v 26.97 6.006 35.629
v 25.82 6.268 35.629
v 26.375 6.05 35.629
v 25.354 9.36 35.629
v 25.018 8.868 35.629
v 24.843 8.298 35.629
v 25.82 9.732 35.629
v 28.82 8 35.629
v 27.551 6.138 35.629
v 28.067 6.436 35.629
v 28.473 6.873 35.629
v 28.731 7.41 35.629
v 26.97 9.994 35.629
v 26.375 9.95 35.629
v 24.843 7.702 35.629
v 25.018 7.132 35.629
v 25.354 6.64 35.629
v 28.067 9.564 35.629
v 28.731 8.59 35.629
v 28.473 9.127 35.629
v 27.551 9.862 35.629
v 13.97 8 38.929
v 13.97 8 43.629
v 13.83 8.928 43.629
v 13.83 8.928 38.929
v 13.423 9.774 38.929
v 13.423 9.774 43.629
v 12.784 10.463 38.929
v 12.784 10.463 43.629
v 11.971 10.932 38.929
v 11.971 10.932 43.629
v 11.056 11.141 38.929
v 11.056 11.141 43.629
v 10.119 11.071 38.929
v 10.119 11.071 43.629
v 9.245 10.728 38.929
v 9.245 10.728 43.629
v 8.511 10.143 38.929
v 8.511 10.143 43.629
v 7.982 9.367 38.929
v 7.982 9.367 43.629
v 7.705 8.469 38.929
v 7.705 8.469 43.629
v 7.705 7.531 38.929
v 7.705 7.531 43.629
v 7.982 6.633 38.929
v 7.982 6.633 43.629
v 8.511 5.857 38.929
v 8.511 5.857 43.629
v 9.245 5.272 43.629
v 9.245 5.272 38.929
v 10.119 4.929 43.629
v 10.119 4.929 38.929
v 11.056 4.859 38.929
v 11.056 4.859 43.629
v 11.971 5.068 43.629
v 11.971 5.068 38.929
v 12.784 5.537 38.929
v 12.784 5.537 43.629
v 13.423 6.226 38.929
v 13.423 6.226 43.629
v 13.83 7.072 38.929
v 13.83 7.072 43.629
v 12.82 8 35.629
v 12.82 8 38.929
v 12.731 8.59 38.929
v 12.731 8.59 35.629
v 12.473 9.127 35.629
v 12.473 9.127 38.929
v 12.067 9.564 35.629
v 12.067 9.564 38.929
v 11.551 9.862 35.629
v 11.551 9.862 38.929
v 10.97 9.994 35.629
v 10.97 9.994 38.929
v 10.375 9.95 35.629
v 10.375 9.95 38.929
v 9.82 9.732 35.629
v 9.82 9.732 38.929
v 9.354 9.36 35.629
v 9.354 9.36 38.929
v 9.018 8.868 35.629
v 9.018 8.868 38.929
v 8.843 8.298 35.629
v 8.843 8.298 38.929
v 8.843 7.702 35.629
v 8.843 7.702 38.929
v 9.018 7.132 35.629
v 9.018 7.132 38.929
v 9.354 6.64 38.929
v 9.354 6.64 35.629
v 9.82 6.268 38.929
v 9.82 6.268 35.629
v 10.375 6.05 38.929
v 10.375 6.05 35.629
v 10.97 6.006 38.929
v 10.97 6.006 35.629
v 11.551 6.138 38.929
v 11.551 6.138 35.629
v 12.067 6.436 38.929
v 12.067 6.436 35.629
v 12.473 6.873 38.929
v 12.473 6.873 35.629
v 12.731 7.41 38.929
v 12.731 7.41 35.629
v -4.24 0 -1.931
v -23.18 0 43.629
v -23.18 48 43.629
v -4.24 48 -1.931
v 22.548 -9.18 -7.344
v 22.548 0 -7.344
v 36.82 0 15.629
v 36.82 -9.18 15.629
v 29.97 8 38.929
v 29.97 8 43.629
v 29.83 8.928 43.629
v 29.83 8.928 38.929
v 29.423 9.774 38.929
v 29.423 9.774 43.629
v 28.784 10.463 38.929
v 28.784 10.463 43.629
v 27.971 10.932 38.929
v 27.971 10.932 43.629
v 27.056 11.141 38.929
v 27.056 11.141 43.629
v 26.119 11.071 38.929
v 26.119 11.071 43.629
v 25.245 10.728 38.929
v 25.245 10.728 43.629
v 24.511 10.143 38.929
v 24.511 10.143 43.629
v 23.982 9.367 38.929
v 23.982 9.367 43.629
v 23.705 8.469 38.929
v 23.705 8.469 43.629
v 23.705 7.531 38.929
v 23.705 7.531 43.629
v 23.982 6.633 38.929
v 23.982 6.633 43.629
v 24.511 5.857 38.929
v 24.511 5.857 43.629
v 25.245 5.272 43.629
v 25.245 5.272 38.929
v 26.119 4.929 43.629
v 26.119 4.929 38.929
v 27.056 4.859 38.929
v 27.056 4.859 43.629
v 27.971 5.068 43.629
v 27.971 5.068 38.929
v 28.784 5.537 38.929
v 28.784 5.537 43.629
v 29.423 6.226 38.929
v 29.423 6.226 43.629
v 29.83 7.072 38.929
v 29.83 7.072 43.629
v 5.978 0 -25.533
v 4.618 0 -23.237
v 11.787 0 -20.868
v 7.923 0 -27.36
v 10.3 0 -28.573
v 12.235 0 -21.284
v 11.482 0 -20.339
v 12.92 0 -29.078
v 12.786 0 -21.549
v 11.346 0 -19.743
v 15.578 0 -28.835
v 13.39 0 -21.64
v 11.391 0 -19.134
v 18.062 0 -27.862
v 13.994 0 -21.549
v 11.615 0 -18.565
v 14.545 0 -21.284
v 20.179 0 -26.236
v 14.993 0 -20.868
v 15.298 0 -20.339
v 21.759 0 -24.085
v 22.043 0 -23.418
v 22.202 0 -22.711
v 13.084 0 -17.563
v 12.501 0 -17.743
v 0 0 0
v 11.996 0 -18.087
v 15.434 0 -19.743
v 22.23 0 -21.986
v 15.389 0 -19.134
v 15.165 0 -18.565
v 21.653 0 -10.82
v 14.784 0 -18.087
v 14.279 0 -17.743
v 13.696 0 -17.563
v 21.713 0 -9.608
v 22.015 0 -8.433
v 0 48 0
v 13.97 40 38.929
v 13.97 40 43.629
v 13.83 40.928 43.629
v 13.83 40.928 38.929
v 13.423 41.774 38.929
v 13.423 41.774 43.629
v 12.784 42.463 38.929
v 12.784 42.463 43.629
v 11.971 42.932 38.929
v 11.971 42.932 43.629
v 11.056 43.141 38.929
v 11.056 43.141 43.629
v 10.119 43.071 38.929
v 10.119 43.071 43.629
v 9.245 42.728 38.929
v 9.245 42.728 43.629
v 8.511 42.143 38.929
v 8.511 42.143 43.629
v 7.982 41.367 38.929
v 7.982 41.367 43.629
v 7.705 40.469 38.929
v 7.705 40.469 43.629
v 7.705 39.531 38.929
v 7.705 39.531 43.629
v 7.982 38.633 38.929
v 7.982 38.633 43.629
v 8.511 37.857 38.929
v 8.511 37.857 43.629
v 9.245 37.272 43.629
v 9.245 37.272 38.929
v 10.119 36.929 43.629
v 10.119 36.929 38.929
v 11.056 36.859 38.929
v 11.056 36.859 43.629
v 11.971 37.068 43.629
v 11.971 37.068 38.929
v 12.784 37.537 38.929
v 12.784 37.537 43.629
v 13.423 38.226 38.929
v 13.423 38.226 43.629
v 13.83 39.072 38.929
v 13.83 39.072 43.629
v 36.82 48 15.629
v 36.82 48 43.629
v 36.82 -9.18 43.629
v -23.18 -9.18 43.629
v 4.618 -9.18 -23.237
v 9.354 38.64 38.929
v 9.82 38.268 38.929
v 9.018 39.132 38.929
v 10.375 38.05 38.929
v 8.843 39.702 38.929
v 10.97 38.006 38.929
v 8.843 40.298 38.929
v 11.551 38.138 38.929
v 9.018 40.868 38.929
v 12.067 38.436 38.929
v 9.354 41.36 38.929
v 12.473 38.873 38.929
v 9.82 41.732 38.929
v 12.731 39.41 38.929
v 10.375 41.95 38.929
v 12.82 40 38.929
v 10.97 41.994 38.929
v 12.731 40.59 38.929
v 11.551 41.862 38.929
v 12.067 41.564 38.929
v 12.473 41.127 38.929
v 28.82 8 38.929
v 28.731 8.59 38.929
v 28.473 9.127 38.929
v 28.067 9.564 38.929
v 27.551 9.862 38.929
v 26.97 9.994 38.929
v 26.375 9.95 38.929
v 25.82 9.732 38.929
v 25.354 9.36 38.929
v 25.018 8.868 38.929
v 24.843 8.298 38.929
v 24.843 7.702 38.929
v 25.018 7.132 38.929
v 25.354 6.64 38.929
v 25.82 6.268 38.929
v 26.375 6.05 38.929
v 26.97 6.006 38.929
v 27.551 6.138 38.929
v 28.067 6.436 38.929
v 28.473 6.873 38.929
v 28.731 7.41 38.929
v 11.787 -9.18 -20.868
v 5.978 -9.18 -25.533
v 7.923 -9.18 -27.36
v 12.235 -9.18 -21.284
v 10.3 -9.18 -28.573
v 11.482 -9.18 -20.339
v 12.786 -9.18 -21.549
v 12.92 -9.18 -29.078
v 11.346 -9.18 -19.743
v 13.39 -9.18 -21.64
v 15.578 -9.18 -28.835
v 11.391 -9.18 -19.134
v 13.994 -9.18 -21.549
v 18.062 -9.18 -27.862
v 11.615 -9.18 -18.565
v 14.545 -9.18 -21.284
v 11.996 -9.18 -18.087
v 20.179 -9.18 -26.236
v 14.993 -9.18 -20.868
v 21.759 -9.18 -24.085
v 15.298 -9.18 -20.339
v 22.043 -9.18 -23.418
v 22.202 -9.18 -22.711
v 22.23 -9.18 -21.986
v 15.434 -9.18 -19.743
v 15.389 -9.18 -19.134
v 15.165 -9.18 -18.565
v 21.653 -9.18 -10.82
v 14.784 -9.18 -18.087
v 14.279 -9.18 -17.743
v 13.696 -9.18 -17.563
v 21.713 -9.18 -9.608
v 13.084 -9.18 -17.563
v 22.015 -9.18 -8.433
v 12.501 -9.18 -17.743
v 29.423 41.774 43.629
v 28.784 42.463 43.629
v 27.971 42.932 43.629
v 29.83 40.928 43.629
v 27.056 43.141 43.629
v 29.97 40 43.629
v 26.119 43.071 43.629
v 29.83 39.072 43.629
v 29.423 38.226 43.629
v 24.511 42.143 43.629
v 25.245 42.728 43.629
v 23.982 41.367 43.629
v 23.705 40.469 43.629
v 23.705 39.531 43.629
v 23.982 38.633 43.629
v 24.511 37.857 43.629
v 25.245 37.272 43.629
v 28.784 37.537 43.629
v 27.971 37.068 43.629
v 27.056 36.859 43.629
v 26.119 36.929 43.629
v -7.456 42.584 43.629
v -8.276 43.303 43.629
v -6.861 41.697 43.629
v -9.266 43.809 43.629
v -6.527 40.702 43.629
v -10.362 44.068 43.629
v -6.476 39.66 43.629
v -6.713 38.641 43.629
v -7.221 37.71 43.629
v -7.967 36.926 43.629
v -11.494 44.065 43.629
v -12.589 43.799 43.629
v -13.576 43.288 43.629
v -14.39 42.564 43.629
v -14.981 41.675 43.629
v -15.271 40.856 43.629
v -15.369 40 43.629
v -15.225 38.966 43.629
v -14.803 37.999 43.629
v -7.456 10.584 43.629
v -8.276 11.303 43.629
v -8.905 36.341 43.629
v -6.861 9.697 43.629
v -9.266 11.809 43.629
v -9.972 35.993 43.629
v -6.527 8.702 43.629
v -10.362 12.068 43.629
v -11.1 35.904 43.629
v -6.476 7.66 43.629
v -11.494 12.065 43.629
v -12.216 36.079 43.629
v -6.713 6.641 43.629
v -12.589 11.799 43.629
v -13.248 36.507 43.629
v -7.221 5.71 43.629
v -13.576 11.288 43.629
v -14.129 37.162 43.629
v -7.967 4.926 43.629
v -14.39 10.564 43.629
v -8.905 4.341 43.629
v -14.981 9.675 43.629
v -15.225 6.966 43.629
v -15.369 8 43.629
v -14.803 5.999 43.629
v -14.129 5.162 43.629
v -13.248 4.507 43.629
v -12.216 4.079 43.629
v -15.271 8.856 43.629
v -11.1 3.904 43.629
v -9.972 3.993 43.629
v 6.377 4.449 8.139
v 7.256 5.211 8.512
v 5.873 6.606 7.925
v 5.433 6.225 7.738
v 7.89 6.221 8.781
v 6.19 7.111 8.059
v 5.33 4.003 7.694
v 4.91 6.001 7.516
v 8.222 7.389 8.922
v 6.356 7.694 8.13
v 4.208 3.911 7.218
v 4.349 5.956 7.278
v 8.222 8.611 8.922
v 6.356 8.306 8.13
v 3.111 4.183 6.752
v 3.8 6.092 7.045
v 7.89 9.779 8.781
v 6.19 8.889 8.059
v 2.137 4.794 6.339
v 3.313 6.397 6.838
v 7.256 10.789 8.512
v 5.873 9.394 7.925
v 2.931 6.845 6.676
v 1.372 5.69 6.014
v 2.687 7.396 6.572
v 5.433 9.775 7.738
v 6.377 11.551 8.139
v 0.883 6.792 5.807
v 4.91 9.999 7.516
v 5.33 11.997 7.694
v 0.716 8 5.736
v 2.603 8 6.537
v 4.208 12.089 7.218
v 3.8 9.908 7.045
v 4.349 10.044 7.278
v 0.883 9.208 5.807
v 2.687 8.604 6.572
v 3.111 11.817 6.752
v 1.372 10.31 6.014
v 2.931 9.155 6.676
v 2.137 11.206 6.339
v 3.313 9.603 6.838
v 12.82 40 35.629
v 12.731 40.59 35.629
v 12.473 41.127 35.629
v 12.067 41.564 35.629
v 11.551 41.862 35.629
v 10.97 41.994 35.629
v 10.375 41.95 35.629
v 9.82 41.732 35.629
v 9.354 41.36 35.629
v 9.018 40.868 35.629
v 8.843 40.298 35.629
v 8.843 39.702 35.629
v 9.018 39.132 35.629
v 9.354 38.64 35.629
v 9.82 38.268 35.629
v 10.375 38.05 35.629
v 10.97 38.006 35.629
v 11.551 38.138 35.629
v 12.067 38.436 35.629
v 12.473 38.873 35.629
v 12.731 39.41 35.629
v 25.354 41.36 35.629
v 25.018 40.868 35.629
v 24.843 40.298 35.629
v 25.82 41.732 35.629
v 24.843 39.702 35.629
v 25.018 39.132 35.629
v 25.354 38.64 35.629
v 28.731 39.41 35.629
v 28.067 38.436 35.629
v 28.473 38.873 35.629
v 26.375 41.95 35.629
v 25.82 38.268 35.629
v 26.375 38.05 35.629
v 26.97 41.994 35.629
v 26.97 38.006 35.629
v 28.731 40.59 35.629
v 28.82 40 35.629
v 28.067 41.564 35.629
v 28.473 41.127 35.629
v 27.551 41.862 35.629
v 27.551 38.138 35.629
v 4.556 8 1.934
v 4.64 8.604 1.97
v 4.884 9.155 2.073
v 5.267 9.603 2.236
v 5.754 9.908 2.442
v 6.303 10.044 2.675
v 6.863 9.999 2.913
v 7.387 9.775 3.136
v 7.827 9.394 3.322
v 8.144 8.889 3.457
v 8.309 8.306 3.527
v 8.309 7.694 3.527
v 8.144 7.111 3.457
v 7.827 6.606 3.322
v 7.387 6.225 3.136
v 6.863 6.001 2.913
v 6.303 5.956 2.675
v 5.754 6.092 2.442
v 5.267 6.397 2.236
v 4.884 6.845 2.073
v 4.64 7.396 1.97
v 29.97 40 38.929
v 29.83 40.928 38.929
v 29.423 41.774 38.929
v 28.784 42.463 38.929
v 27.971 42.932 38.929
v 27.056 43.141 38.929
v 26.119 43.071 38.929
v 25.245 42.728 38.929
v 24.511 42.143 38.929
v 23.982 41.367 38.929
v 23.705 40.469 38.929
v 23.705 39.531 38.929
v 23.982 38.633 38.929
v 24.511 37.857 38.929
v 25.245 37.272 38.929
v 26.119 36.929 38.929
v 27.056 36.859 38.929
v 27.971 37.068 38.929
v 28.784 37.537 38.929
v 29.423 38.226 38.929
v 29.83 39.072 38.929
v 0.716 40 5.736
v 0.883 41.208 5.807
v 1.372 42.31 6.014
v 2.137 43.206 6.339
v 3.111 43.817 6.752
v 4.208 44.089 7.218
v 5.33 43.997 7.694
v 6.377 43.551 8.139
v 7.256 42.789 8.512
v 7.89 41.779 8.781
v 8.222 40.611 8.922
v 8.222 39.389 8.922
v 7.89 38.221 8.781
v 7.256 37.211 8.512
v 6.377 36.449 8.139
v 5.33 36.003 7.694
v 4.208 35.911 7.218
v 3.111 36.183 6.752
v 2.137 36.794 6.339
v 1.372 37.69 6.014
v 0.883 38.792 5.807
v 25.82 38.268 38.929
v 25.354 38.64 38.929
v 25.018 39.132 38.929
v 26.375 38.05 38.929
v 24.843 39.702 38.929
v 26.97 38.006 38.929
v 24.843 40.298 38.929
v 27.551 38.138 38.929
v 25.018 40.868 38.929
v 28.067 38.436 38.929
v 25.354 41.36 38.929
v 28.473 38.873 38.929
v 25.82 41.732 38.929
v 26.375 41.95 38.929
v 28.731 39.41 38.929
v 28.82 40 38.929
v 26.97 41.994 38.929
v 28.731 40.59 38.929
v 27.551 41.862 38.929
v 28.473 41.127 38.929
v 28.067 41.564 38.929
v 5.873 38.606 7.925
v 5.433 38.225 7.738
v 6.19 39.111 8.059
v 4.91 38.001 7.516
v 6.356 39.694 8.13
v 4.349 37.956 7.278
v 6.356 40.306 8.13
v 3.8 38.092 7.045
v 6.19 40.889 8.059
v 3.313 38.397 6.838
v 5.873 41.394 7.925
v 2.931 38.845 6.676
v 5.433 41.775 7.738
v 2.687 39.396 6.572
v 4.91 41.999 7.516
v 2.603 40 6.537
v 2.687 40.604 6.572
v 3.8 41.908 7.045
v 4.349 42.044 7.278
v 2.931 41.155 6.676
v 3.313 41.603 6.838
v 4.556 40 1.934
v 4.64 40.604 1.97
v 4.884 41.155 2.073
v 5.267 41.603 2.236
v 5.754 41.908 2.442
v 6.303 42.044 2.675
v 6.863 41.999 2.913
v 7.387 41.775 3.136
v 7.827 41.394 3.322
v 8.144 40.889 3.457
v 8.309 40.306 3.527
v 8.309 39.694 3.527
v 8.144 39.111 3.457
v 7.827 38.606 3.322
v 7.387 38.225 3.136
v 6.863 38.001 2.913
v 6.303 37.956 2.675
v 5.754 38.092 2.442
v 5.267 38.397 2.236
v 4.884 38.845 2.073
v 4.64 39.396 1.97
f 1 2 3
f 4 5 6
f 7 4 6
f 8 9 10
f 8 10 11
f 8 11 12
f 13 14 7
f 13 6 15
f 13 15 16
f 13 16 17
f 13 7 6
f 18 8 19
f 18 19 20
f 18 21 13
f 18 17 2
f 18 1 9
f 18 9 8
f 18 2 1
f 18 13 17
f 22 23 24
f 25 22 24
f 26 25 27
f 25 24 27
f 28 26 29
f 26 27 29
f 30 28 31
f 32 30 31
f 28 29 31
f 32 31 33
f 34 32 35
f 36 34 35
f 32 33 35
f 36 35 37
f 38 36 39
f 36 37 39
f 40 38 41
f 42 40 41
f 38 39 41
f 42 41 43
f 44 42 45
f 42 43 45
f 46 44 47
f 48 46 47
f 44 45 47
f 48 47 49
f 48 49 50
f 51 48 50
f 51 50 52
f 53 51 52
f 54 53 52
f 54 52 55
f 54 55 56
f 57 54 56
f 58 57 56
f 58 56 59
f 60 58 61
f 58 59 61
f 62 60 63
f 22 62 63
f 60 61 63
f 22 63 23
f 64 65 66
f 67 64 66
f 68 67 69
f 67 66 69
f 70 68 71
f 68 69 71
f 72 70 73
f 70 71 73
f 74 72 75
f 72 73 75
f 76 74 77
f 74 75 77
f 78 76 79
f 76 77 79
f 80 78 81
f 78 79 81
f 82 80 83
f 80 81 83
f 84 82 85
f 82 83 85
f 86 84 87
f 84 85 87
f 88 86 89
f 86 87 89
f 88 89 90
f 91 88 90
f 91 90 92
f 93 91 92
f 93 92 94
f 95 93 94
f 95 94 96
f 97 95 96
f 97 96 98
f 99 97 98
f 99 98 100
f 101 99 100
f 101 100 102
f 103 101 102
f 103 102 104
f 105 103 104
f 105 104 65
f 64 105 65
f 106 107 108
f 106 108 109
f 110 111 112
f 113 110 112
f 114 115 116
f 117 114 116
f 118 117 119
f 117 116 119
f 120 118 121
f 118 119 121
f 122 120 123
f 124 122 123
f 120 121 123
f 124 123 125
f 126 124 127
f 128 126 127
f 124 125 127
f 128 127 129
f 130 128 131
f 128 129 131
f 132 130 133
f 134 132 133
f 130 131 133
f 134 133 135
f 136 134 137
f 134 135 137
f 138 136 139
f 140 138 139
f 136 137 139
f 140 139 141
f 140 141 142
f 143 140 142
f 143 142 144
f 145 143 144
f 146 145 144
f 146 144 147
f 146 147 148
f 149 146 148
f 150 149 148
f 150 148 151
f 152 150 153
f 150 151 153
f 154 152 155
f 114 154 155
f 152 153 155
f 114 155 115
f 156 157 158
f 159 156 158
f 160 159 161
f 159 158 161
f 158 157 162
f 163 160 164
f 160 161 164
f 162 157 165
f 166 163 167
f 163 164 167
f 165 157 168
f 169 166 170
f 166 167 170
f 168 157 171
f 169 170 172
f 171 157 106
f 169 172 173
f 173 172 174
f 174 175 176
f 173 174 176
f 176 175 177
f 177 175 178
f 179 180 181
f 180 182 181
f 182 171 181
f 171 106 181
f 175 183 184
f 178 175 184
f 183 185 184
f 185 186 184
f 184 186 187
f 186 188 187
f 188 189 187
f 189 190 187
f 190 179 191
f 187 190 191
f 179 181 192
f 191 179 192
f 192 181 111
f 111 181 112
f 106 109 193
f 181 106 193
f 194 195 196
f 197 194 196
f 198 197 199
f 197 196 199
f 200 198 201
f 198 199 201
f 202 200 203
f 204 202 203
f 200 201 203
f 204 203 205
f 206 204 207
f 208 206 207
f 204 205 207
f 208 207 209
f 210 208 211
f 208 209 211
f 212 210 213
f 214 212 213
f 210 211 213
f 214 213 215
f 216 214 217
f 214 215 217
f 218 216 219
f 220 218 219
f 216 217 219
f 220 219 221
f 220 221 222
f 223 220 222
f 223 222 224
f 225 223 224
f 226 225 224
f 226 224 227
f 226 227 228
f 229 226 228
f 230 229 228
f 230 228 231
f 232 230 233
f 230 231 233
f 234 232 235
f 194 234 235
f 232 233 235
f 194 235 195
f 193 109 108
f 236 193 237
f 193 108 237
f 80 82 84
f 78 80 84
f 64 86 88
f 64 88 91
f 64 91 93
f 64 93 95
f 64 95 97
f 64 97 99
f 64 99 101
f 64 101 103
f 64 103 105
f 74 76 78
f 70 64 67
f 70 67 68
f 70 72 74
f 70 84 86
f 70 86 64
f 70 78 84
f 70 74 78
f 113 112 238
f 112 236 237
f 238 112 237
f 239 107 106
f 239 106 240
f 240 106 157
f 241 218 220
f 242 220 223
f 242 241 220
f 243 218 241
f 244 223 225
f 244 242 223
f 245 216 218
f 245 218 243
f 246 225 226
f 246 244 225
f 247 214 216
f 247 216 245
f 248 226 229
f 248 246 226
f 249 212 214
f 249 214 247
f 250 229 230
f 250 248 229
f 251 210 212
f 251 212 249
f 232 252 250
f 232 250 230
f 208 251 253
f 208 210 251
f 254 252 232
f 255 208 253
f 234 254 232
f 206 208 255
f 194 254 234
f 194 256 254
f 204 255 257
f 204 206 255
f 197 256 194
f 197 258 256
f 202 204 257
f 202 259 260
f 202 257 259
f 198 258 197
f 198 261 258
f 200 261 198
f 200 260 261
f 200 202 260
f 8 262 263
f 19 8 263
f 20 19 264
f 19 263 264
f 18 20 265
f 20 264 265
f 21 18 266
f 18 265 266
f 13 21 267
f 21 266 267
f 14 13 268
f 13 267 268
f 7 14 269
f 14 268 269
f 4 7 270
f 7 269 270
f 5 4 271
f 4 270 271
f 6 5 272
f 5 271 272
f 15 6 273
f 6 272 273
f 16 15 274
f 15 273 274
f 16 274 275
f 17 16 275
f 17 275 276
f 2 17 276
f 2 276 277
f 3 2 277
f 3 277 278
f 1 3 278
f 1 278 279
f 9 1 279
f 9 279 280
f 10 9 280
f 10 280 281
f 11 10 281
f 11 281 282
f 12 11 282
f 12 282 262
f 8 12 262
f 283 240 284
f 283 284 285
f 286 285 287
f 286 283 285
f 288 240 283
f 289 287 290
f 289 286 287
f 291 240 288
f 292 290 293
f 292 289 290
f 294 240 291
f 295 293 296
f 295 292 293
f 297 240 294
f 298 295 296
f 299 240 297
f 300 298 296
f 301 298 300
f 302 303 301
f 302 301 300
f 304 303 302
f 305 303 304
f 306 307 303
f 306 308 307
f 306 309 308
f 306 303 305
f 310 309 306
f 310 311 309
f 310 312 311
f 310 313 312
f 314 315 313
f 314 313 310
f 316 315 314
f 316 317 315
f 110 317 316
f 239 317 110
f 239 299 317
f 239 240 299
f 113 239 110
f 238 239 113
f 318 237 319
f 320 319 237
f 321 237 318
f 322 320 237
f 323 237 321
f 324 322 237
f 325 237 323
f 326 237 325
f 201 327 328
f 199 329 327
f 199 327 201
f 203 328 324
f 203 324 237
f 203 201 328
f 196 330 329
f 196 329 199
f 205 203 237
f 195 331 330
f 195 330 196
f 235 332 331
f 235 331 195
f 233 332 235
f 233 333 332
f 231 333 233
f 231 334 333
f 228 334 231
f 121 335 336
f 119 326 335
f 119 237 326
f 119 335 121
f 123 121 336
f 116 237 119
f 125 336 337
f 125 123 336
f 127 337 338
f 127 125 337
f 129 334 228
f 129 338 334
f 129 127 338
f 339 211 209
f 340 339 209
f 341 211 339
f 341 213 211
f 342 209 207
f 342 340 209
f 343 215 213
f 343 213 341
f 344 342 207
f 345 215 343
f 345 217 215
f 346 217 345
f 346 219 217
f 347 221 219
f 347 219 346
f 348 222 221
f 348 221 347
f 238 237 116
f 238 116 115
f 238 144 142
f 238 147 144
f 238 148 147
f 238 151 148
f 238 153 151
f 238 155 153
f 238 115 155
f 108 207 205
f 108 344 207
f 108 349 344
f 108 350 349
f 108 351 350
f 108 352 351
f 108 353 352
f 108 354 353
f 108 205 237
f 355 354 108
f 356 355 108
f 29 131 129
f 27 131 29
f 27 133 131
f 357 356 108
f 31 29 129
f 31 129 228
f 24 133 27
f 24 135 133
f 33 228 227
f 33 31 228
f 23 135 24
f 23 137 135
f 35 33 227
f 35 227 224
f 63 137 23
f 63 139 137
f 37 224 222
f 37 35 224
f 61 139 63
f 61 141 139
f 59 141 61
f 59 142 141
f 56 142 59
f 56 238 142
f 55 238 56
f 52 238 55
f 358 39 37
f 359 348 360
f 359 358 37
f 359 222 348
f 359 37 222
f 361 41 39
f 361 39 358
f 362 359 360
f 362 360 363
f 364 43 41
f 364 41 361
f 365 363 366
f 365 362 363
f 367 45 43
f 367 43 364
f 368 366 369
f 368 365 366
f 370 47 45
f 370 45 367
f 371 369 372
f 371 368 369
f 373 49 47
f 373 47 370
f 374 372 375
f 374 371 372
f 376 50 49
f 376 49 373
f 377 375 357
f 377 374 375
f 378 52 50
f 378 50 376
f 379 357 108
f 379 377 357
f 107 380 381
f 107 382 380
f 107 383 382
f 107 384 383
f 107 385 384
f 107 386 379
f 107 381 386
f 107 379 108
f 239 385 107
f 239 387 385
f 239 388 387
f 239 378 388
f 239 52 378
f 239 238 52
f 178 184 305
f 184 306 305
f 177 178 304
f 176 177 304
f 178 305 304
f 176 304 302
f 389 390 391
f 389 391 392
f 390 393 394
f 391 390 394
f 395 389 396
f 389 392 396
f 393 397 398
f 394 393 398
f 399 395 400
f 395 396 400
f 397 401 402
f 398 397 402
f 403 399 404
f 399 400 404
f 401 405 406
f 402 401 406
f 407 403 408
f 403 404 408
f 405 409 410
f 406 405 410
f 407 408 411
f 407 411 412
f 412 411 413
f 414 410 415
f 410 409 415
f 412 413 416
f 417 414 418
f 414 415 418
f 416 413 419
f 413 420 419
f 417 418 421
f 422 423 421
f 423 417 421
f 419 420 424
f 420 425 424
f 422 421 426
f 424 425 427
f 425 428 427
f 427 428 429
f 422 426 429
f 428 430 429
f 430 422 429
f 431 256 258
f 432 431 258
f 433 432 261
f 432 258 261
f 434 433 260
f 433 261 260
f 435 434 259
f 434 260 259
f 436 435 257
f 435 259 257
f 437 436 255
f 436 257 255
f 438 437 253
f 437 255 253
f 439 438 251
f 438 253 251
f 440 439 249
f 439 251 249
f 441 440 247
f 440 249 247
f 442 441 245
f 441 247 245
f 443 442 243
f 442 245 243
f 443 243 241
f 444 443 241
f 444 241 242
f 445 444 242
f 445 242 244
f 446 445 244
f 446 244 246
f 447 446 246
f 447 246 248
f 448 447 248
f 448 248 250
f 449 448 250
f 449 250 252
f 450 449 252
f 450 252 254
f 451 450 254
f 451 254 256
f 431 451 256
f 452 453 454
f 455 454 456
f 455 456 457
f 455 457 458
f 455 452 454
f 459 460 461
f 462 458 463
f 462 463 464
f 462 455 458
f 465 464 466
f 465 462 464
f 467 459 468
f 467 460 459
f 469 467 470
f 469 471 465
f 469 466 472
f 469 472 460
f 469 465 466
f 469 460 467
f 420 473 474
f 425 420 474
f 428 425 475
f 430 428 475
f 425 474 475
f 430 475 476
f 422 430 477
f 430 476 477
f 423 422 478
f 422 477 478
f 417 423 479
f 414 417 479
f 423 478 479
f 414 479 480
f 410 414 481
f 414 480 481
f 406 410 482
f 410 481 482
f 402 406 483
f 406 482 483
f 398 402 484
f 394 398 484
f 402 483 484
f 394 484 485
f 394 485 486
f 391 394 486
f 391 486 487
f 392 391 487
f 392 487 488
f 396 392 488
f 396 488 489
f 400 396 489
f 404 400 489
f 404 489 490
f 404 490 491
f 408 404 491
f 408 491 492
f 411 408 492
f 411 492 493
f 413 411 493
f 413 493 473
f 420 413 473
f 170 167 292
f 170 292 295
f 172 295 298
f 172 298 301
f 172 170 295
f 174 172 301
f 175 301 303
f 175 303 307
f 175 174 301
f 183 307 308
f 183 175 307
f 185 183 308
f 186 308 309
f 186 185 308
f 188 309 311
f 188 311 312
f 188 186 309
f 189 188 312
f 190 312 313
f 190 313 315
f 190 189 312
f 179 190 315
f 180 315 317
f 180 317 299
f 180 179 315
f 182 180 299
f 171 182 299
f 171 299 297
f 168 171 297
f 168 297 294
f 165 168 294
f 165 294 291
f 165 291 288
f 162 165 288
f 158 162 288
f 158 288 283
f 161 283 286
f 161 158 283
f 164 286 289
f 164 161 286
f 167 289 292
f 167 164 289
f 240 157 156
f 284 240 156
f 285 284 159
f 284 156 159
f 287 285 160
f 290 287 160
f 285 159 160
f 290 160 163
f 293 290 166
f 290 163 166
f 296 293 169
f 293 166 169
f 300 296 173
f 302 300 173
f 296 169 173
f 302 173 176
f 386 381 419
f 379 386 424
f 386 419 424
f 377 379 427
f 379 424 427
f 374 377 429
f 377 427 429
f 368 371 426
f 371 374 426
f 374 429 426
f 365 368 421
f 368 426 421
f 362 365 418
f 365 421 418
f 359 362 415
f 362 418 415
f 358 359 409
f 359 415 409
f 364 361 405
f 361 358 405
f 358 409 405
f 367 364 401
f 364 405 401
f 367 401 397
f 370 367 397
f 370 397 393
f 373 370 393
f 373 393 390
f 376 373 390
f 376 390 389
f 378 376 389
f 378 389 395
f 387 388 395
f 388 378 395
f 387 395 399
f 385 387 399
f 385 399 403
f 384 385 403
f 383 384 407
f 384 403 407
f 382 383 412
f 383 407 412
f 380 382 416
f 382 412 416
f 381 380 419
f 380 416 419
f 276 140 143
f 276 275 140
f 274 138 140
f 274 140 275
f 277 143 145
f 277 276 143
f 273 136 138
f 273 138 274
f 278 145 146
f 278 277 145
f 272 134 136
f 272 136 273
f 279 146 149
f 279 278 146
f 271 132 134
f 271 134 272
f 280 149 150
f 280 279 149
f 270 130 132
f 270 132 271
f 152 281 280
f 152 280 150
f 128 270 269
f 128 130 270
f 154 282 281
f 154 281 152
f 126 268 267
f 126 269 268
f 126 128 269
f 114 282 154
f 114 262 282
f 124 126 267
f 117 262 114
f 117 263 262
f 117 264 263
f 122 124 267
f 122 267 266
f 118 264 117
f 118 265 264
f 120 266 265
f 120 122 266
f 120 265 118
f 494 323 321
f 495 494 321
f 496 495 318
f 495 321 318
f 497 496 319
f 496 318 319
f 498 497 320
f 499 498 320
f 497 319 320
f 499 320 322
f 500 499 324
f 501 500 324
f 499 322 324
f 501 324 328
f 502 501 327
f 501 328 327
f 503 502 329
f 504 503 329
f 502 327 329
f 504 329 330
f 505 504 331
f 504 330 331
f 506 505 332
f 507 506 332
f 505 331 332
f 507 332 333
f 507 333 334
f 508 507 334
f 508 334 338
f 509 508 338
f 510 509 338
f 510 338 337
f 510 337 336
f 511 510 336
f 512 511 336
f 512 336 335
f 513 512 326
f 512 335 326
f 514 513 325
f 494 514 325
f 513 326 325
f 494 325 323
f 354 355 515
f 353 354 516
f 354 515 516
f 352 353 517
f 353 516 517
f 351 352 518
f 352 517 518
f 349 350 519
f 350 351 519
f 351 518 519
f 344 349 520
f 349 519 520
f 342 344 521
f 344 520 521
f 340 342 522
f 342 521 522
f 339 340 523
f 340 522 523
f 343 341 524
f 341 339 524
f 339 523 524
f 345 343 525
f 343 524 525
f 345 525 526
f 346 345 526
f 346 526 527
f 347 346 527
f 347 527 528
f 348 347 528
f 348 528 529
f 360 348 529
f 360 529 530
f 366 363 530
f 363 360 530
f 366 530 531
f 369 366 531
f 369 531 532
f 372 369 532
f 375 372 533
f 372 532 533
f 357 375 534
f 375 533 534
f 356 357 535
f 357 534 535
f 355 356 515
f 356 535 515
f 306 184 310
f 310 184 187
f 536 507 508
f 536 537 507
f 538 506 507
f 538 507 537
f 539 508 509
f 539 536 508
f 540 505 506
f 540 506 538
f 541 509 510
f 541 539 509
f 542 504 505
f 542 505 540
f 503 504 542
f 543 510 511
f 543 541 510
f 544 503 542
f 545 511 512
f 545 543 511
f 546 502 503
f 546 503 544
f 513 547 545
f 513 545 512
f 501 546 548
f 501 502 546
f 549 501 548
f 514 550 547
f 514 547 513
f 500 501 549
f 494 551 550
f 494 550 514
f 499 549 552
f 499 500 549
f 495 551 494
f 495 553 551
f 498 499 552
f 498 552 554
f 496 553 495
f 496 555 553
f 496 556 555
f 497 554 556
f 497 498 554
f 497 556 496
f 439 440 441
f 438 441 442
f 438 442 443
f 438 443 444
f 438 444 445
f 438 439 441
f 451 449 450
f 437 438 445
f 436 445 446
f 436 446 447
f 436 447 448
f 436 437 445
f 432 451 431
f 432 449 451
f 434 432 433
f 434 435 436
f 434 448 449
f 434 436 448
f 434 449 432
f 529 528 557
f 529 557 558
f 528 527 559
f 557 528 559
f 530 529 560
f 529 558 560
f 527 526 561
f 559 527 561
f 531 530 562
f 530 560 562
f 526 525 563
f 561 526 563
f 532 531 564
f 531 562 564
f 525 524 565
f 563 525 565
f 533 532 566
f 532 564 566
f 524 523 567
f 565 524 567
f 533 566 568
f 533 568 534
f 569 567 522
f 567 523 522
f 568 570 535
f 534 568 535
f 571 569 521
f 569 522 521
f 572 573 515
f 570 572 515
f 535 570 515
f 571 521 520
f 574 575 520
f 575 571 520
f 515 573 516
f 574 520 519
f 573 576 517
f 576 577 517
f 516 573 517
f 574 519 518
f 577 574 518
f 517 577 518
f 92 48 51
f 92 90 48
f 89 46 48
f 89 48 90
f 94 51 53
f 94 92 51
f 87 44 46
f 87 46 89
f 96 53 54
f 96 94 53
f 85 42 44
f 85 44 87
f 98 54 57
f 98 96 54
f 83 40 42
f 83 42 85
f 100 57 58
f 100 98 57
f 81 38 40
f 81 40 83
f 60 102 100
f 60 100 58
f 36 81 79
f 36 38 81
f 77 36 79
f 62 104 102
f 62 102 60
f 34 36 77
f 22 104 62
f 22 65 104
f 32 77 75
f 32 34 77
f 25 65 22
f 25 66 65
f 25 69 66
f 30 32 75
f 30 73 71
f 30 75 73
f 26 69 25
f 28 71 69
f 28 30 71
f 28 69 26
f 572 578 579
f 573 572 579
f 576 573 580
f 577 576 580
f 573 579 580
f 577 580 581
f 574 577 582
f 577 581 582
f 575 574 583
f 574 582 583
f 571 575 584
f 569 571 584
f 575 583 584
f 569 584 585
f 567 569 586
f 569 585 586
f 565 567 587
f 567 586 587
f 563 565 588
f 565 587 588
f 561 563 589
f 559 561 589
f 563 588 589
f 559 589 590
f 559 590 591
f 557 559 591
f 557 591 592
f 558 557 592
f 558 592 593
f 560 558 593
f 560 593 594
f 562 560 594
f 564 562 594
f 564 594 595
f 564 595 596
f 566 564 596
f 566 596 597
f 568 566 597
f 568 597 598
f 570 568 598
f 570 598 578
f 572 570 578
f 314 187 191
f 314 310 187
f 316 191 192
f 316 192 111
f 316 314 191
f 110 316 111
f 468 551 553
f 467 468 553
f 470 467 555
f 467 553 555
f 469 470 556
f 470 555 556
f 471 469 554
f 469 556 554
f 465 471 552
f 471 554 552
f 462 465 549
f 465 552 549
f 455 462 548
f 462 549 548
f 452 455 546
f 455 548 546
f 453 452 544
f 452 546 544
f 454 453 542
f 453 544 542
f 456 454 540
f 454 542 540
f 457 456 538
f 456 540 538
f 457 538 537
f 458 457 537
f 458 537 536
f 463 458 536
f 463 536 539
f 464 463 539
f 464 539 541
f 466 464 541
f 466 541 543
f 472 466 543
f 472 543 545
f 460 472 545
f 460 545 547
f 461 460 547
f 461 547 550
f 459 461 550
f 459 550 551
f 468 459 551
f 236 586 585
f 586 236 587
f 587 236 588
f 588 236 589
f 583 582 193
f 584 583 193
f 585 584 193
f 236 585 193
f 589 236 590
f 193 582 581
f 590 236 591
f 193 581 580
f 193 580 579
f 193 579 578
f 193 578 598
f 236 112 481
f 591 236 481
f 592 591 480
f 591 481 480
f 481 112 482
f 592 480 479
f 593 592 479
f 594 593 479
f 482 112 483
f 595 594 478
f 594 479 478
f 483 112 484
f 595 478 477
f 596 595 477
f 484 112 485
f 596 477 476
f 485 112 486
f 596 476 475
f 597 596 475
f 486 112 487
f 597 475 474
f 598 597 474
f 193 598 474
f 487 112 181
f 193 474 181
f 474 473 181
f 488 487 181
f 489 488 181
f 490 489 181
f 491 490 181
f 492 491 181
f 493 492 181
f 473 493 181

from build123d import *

# Parameters (mm, degrees)
BOSS_EXTRUDE1_DEPTH = 48
SKETCH4_R           = 3.15
SKETCH4_R_2         = 2
CUT_EXTRUDE2_DEPTH  = 4.7
SKETCH6_R           = 2.05
BOSS_EXTRUDE3_DEPTH = 9.18
SKETCH4_3_R         = 2
CUT_EXTRUDE3_DEPTH  = 8
FILLET3_R           = 4
FILLET4_R           = 6
BOSS_EXTRUDE4_DEPTH = 48
CUT_EXTRUDE6_START  = -5
SKETCH3_R           = 4.1
CUT_EXTRUDE6_DEPTH  = 66
SKETCH3_3_R         = 2.05
CUT_EXTRUDE7_DEPTH  = 7


with BuildPart() as part:
    # Sketch2 → Boss-Extrude1 (new body)
    with BuildSketch(Plane(origin=(0, 0, 0), x_dir=(1, 0, 0), z_dir=(0, 1, 0))):
        Polygon((0, 0), (0, -15.62924514), (0, -43.62924514), (36.820194138, -43.62924514), (36.820194138, -15.62924514), align=None)
    extrude(amount=BOSS_EXTRUDE1_DEPTH)

    # Sketch4 → Cut-Extrude2 (cut)
    # profile 1 of 8: a face of its own
    with BuildSketch(Plane.XY.offset(43.62924514)):
        with Locations((10.820194138, 40)):
            Circle(SKETCH4_R)
        with Locations((10.820194138, 40)):
            Circle(SKETCH4_R_2, mode=Mode.SUBTRACT)
    # profile 2 of 8: a face of its own
    with BuildSketch(Plane.XY.offset(43.62924514)):
        with Locations((10.820194138, 40)):
            Circle(SKETCH4_R_2)
    # profile 3 of 8: a face of its own
    with BuildSketch(Plane.XY.offset(43.62924514)):
        with Locations((26.820194138, 40)):
            Circle(SKETCH4_R)
        with Locations((26.820194138, 40)):
            Circle(SKETCH4_R_2, mode=Mode.SUBTRACT)
    # profile 4 of 8: a face of its own
    with BuildSketch(Plane.XY.offset(43.62924514)):
        with Locations((26.820194138, 40)):
            Circle(SKETCH4_R_2)
    # profile 5 of 8: a face of its own
    with BuildSketch(Plane.XY.offset(43.62924514)):
        with Locations((26.820194138, 8)):
            Circle(SKETCH4_R)
        with Locations((26.820194138, 8)):
            Circle(SKETCH4_R_2, mode=Mode.SUBTRACT)
    # profile 6 of 8: a face of its own
    with BuildSketch(Plane.XY.offset(43.62924514)):
        with Locations((26.820194138, 8)):
            Circle(SKETCH4_R_2)
    # profile 7 of 8: a face of its own
    with BuildSketch(Plane.XY.offset(43.62924514)):
        with Locations((10.820194138, 8)):
            Circle(SKETCH4_R)
        with Locations((10.820194138, 8)):
            Circle(SKETCH4_R_2, mode=Mode.SUBTRACT)
    # profile 8 of 8: a face of its own
    with BuildSketch(Plane.XY.offset(43.62924514)):
        with Locations((10.820194138, 8)):
            Circle(SKETCH4_R_2)
    extrude(amount=-CUT_EXTRUDE2_DEPTH, mode=Mode.SUBTRACT)

    # Sketch6 → Boss-Extrude3 (add)
    with BuildSketch(Plane.XZ):
        with BuildLine():
            Line((21.555608411, -8.941223432), (36.820194138, 15.62924514))
            Line((36.820194138, 15.62924514), (36.820194138, 43.62924514))
            Line((36.820194138, 43.62924514), (-23.179805862, 43.62924514))
            Line((-23.179805862, 43.62924514), (4.617828, -23.236779181))
            ThreePointArc((4.617828, -23.236779181), (13.54895559, -29.088670071), (22.279280146, -22.941223432))
            Line((22.279280146, -22.941223432), (21.555608411, -8.941223432))
        make_face()
        with Locations(Location((13.39, -19.59, 0), (0, 0, 270))):
            Circle(SKETCH6_R, mode=Mode.SUBTRACT)
    extrude(amount=BOSS_EXTRUDE3_DEPTH)

    # Sketch4<3> → Cut-Extrude3 (cut)
    with BuildSketch(Plane.XY.offset(43.62924514)):
        with Locations((10.820194138, 40)):
            Circle(SKETCH4_3_R)
        with Locations((26.820194138, 40)):
            Circle(SKETCH4_3_R)
        with Locations((26.820194138, 8)):
            Circle(SKETCH4_3_R)
        with Locations((10.820194138, 8)):
            Circle(SKETCH4_3_R)
    extrude(amount=-CUT_EXTRUDE3_DEPTH, mode=Mode.SUBTRACT)

    # Fillet3
    fillet3_edges = [part.edges().sort_by_distance(p)[0] for p in [
        (22.279280146, -4.59, -22.941223432),
    ]]
    fillet(fillet3_edges, radius=FILLET3_R)

    # Fillet4
    fillet4_edges = [part.edges().sort_by_distance(p)[0] for p in [
        (21.555608411, -4.59, -8.941223432),
    ]]
    fillet(fillet4_edges, radius=FILLET4_R)

    # Sketch6<3> → Boss-Extrude4 (add)
    with BuildSketch(Plane.XZ):
        Polygon((-23.179805862, 43.62924514), (0, 0), (0, 43.62924514), align=None)
        Polygon((-4.239616227, -1.930574343), (0, 0), (-23.179805862, 43.62924514), align=None)
    extrude(amount=-BOSS_EXTRUDE4_DEPTH)

    # Sketch3 → Cut-Extrude6 (cut)
    with BuildSketch(Plane(origin=(0, 0, 0), x_dir=(-0.9205048534524429, 0, -0.3907311284892679), z_dir=(0.3907311284892679, 0, -0.9205048534524429)).offset(CUT_EXTRUDE6_START)):
        with Locations((-7, 40)):
            Circle(SKETCH3_R)
        with Locations((-7, 8)):
            Circle(SKETCH3_R)
    extrude(amount=-CUT_EXTRUDE6_DEPTH, mode=Mode.SUBTRACT)

    # Sketch3<3> → Cut-Extrude7 (cut)
    with BuildSketch(Plane(origin=(0, 0, 0), x_dir=(-0.9205048534524429, 0, -0.3907311284892679), z_dir=(0.3907311284892679, 0, -0.9205048534524429))):
        with Locations((-7, 40)):
            Circle(SKETCH3_3_R)
        with Locations((-7, 8)):
            Circle(SKETCH3_3_R)
    extrude(amount=-CUT_EXTRUDE7_DEPTH, mode=Mode.SUBTRACT)


solid = part.part
